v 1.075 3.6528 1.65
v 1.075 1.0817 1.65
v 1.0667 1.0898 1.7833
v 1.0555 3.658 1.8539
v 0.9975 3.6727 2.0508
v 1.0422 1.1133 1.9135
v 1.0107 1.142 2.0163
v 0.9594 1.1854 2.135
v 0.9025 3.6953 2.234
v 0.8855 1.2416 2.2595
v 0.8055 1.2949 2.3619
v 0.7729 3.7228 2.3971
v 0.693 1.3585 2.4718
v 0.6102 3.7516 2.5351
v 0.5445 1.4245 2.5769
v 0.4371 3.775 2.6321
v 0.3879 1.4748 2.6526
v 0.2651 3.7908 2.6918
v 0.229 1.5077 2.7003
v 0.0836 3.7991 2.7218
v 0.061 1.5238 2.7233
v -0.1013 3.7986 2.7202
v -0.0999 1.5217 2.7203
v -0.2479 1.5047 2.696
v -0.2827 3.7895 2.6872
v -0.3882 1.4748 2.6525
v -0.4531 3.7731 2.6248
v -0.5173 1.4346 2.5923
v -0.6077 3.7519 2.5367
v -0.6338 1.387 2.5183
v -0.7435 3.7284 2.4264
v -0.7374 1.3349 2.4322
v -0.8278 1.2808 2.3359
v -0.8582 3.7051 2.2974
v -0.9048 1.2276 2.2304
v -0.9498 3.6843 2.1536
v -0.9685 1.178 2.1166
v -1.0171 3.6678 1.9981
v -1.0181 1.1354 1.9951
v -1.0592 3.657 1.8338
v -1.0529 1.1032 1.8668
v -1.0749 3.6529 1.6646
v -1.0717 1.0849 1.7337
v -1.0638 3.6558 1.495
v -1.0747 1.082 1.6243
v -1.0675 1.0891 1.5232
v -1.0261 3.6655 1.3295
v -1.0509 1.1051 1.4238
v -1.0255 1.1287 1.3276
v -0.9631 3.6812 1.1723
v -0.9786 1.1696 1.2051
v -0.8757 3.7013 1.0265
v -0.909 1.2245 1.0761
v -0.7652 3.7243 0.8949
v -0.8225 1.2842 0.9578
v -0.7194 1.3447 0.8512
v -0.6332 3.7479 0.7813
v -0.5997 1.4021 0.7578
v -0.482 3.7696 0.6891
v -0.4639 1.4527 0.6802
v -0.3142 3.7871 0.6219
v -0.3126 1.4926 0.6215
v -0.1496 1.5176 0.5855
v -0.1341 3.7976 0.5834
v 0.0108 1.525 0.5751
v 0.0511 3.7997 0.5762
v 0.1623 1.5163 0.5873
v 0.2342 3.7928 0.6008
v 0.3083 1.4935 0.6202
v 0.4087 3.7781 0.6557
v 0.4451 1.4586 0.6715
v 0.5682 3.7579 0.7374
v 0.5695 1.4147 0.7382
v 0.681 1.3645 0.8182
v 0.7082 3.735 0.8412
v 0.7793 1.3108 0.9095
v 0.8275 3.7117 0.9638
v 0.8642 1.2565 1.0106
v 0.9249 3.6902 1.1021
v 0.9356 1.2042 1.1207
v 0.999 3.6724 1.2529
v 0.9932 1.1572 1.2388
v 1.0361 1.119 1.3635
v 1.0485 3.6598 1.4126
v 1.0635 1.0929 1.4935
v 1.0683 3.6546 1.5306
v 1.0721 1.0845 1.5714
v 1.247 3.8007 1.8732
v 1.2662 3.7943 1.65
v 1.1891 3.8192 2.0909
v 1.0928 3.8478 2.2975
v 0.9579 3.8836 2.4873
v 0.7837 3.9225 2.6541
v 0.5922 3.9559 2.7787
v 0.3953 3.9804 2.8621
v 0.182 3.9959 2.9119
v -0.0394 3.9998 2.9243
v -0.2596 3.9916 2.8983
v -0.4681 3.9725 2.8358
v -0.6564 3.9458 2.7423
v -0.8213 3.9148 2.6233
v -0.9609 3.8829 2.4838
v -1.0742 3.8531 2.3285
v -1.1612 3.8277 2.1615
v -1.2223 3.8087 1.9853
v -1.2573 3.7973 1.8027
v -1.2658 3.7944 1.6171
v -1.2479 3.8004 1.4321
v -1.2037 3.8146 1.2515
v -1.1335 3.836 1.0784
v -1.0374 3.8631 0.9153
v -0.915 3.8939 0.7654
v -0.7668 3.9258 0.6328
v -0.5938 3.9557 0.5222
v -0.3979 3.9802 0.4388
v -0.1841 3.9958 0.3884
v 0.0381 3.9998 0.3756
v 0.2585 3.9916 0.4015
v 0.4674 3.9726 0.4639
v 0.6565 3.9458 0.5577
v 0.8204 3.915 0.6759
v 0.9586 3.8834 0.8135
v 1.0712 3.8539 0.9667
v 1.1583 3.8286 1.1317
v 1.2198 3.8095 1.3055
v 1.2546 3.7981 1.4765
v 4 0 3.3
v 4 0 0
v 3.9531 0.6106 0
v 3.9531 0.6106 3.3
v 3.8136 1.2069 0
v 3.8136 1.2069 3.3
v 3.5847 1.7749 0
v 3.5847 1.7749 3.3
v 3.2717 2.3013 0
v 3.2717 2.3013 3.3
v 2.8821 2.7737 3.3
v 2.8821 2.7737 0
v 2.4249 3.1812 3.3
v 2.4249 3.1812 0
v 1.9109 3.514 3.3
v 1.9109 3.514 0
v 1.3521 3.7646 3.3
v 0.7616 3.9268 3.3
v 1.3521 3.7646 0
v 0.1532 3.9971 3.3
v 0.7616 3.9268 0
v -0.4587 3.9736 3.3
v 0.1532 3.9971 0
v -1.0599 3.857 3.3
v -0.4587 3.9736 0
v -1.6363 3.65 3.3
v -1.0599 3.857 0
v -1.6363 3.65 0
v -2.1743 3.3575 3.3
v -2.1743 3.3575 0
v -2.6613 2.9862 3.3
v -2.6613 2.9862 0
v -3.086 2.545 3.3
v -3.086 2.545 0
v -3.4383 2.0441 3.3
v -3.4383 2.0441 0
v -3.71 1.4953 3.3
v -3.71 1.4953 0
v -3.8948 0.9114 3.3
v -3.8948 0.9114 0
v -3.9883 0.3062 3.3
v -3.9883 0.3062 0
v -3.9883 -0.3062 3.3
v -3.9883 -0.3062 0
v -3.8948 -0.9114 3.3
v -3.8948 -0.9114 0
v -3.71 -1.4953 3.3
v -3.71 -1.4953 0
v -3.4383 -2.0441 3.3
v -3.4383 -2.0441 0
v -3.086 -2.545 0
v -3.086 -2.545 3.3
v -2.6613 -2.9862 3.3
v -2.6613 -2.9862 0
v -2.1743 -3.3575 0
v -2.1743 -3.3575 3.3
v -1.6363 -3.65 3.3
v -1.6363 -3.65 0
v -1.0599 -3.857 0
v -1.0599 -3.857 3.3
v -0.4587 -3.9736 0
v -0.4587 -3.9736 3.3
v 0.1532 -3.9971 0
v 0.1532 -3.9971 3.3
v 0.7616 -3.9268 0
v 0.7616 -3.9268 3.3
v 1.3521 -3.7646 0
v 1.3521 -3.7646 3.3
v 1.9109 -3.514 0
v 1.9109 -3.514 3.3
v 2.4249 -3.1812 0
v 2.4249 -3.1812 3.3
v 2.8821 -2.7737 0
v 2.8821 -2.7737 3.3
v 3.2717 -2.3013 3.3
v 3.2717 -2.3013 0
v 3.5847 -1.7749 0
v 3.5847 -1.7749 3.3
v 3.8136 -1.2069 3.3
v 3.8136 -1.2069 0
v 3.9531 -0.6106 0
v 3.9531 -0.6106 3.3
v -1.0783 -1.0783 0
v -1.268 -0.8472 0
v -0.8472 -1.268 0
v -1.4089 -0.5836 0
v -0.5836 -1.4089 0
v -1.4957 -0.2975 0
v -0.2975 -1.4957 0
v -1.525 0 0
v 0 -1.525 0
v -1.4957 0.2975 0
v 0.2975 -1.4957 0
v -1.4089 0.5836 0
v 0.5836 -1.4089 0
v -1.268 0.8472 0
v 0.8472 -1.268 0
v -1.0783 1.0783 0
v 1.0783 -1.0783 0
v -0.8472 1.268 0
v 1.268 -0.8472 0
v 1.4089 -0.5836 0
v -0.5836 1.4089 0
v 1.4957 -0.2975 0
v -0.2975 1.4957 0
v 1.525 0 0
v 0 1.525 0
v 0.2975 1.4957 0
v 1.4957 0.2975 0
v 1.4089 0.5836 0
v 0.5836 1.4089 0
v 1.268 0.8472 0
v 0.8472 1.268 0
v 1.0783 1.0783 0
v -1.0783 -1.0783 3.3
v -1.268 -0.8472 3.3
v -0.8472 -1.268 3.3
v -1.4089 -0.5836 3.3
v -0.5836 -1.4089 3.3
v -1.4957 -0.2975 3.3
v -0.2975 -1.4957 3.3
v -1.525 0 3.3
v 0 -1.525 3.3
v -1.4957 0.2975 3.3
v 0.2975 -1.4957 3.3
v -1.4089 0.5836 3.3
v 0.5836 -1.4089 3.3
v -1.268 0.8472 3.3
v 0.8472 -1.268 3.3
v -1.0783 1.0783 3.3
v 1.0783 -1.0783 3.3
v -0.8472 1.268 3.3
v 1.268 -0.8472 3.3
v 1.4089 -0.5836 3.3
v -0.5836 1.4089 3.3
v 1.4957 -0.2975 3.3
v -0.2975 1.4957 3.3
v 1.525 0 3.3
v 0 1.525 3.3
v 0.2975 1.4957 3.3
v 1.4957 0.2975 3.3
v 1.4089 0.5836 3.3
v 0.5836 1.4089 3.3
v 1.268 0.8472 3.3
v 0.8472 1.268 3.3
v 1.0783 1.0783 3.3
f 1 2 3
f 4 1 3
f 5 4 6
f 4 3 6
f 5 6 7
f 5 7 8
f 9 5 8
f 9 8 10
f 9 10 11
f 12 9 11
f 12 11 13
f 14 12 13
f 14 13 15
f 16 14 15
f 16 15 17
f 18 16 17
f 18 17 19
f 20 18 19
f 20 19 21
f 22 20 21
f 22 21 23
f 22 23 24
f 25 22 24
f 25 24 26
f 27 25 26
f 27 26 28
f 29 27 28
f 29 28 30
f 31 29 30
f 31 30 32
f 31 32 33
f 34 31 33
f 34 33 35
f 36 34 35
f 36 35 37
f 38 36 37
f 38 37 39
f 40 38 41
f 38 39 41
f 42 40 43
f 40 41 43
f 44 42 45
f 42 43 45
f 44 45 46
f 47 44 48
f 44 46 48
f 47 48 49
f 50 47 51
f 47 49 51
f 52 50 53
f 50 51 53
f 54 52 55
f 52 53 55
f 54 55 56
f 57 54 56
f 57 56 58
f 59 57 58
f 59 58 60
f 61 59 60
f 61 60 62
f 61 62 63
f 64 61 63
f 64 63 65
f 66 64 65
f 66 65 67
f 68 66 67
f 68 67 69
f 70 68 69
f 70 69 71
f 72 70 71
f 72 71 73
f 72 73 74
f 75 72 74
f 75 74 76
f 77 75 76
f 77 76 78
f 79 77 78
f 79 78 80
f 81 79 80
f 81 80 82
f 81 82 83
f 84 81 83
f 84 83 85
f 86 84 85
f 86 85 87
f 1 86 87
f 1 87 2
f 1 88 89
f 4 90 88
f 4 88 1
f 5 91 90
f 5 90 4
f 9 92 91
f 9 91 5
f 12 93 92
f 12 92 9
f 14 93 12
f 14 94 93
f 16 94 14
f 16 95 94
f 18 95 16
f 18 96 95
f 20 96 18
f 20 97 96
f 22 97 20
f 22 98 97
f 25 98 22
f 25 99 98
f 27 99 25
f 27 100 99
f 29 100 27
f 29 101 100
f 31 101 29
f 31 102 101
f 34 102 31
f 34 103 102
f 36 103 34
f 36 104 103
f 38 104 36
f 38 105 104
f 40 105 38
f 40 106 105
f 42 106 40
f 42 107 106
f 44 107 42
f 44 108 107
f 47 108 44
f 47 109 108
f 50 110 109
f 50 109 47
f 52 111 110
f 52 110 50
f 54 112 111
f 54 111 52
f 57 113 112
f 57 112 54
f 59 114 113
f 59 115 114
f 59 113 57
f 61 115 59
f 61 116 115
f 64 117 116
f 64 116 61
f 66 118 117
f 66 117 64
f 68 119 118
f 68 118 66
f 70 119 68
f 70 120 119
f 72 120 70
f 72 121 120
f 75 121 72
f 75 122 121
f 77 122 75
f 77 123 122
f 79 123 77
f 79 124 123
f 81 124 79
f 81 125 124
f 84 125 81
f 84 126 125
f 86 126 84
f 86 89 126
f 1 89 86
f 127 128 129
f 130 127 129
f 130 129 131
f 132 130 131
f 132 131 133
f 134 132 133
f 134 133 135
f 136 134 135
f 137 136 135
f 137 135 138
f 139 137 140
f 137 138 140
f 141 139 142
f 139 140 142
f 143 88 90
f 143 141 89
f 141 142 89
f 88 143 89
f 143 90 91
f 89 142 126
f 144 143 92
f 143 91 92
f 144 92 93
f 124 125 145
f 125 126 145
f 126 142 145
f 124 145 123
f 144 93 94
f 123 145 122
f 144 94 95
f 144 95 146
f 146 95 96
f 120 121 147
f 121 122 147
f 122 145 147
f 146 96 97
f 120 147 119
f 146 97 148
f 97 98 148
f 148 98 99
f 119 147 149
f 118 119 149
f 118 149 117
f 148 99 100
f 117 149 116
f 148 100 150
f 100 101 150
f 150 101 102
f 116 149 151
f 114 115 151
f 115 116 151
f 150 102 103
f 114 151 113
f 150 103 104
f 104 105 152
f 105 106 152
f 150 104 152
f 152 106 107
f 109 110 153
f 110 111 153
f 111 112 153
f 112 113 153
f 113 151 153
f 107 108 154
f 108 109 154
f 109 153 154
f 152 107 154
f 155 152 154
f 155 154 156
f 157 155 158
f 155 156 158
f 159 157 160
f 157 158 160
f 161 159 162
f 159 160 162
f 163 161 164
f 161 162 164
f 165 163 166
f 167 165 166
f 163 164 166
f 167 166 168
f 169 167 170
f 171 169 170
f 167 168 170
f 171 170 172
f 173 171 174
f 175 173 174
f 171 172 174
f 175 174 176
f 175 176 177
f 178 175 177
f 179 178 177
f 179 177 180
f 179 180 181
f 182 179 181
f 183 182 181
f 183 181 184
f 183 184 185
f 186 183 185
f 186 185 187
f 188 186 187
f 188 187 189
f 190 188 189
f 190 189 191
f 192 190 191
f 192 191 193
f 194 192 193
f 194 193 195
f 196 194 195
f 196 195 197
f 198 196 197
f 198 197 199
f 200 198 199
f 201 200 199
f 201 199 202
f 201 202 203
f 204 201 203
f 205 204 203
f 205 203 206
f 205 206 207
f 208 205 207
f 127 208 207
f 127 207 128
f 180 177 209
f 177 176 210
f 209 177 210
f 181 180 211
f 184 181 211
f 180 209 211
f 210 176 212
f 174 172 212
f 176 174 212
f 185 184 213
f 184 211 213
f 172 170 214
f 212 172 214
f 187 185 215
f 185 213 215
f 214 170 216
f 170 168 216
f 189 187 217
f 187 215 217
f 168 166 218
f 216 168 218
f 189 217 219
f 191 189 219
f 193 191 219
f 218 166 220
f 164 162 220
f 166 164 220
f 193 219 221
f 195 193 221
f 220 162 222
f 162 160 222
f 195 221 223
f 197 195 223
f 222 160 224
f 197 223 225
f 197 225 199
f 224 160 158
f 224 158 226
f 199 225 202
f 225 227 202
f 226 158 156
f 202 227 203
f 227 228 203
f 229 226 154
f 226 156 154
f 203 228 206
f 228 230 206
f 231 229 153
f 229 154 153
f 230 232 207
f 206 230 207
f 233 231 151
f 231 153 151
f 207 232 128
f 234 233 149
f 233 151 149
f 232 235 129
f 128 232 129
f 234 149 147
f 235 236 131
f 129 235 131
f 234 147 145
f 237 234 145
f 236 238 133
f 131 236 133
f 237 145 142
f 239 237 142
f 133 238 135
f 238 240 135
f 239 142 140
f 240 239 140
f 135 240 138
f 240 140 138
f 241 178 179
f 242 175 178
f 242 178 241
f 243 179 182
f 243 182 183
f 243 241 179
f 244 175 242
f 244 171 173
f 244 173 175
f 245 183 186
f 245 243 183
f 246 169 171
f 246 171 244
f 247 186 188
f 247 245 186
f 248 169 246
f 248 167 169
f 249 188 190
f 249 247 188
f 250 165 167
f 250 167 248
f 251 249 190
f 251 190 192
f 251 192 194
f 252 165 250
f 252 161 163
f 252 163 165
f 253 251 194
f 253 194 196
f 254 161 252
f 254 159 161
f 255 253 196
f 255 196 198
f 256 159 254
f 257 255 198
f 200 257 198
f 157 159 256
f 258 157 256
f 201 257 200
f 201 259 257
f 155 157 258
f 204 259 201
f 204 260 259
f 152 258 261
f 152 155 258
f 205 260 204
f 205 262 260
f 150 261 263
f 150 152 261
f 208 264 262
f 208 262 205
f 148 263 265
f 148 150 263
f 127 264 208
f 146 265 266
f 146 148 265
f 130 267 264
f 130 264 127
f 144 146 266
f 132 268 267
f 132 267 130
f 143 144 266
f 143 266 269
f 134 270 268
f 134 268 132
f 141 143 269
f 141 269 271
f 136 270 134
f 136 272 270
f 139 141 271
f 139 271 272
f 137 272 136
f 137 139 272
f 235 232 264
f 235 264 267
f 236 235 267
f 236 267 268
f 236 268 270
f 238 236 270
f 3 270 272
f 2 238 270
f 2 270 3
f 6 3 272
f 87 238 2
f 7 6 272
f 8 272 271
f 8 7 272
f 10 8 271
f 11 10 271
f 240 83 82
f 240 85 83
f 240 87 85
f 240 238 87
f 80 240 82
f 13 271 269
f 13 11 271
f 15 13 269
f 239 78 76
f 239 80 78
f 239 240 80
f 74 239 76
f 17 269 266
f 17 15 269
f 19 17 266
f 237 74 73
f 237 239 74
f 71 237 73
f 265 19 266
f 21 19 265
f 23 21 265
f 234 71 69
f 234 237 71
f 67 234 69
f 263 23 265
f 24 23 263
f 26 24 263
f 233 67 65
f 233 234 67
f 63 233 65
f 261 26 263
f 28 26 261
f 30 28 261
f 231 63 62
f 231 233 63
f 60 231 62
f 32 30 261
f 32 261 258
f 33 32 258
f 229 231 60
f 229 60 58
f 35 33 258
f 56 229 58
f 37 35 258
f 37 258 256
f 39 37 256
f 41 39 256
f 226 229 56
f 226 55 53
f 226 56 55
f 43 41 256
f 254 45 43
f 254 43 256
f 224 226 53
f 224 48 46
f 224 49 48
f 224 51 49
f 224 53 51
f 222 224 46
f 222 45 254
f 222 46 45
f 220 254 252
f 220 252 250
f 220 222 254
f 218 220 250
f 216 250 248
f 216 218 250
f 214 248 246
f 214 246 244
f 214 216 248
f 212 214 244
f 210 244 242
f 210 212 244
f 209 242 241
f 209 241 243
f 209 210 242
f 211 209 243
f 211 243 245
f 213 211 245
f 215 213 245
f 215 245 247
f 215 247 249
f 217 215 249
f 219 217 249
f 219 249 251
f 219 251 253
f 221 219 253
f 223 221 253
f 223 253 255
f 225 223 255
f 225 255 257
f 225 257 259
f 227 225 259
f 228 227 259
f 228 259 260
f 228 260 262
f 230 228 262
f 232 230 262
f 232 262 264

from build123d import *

# Parameters (mm, degrees)
SKETCH_R     = 4
SKETCH_R_2   = 1.525
PAD_DEPTH    = 3.3
SKETCH001_R  = 1.075
HOLE_DEPTH   = 5
CHAMFER_SIZE = 0.2


with BuildPart() as part:
    # Sketch → Pad (new body)
    with BuildSketch(Plane.XY):
        Circle(SKETCH_R)
        Circle(SKETCH_R_2, mode=Mode.SUBTRACT)
    extrude(amount=PAD_DEPTH)

    # Sketch001 → Hole (cut)
    with BuildSketch(Plane.XZ):
        with Locations((0, 1.65)):
            Circle(SKETCH001_R)
    extrude(amount=-HOLE_DEPTH, mode=Mode.SUBTRACT)

    # Chamfer
    chamfer_edges = [part.edges().sort_by_distance(p)[0] for p in [
        (1.075, 3.85284, 1.65),
    ]]
    chamfer(chamfer_edges, length=CHAMFER_SIZE)


solid = part.part
